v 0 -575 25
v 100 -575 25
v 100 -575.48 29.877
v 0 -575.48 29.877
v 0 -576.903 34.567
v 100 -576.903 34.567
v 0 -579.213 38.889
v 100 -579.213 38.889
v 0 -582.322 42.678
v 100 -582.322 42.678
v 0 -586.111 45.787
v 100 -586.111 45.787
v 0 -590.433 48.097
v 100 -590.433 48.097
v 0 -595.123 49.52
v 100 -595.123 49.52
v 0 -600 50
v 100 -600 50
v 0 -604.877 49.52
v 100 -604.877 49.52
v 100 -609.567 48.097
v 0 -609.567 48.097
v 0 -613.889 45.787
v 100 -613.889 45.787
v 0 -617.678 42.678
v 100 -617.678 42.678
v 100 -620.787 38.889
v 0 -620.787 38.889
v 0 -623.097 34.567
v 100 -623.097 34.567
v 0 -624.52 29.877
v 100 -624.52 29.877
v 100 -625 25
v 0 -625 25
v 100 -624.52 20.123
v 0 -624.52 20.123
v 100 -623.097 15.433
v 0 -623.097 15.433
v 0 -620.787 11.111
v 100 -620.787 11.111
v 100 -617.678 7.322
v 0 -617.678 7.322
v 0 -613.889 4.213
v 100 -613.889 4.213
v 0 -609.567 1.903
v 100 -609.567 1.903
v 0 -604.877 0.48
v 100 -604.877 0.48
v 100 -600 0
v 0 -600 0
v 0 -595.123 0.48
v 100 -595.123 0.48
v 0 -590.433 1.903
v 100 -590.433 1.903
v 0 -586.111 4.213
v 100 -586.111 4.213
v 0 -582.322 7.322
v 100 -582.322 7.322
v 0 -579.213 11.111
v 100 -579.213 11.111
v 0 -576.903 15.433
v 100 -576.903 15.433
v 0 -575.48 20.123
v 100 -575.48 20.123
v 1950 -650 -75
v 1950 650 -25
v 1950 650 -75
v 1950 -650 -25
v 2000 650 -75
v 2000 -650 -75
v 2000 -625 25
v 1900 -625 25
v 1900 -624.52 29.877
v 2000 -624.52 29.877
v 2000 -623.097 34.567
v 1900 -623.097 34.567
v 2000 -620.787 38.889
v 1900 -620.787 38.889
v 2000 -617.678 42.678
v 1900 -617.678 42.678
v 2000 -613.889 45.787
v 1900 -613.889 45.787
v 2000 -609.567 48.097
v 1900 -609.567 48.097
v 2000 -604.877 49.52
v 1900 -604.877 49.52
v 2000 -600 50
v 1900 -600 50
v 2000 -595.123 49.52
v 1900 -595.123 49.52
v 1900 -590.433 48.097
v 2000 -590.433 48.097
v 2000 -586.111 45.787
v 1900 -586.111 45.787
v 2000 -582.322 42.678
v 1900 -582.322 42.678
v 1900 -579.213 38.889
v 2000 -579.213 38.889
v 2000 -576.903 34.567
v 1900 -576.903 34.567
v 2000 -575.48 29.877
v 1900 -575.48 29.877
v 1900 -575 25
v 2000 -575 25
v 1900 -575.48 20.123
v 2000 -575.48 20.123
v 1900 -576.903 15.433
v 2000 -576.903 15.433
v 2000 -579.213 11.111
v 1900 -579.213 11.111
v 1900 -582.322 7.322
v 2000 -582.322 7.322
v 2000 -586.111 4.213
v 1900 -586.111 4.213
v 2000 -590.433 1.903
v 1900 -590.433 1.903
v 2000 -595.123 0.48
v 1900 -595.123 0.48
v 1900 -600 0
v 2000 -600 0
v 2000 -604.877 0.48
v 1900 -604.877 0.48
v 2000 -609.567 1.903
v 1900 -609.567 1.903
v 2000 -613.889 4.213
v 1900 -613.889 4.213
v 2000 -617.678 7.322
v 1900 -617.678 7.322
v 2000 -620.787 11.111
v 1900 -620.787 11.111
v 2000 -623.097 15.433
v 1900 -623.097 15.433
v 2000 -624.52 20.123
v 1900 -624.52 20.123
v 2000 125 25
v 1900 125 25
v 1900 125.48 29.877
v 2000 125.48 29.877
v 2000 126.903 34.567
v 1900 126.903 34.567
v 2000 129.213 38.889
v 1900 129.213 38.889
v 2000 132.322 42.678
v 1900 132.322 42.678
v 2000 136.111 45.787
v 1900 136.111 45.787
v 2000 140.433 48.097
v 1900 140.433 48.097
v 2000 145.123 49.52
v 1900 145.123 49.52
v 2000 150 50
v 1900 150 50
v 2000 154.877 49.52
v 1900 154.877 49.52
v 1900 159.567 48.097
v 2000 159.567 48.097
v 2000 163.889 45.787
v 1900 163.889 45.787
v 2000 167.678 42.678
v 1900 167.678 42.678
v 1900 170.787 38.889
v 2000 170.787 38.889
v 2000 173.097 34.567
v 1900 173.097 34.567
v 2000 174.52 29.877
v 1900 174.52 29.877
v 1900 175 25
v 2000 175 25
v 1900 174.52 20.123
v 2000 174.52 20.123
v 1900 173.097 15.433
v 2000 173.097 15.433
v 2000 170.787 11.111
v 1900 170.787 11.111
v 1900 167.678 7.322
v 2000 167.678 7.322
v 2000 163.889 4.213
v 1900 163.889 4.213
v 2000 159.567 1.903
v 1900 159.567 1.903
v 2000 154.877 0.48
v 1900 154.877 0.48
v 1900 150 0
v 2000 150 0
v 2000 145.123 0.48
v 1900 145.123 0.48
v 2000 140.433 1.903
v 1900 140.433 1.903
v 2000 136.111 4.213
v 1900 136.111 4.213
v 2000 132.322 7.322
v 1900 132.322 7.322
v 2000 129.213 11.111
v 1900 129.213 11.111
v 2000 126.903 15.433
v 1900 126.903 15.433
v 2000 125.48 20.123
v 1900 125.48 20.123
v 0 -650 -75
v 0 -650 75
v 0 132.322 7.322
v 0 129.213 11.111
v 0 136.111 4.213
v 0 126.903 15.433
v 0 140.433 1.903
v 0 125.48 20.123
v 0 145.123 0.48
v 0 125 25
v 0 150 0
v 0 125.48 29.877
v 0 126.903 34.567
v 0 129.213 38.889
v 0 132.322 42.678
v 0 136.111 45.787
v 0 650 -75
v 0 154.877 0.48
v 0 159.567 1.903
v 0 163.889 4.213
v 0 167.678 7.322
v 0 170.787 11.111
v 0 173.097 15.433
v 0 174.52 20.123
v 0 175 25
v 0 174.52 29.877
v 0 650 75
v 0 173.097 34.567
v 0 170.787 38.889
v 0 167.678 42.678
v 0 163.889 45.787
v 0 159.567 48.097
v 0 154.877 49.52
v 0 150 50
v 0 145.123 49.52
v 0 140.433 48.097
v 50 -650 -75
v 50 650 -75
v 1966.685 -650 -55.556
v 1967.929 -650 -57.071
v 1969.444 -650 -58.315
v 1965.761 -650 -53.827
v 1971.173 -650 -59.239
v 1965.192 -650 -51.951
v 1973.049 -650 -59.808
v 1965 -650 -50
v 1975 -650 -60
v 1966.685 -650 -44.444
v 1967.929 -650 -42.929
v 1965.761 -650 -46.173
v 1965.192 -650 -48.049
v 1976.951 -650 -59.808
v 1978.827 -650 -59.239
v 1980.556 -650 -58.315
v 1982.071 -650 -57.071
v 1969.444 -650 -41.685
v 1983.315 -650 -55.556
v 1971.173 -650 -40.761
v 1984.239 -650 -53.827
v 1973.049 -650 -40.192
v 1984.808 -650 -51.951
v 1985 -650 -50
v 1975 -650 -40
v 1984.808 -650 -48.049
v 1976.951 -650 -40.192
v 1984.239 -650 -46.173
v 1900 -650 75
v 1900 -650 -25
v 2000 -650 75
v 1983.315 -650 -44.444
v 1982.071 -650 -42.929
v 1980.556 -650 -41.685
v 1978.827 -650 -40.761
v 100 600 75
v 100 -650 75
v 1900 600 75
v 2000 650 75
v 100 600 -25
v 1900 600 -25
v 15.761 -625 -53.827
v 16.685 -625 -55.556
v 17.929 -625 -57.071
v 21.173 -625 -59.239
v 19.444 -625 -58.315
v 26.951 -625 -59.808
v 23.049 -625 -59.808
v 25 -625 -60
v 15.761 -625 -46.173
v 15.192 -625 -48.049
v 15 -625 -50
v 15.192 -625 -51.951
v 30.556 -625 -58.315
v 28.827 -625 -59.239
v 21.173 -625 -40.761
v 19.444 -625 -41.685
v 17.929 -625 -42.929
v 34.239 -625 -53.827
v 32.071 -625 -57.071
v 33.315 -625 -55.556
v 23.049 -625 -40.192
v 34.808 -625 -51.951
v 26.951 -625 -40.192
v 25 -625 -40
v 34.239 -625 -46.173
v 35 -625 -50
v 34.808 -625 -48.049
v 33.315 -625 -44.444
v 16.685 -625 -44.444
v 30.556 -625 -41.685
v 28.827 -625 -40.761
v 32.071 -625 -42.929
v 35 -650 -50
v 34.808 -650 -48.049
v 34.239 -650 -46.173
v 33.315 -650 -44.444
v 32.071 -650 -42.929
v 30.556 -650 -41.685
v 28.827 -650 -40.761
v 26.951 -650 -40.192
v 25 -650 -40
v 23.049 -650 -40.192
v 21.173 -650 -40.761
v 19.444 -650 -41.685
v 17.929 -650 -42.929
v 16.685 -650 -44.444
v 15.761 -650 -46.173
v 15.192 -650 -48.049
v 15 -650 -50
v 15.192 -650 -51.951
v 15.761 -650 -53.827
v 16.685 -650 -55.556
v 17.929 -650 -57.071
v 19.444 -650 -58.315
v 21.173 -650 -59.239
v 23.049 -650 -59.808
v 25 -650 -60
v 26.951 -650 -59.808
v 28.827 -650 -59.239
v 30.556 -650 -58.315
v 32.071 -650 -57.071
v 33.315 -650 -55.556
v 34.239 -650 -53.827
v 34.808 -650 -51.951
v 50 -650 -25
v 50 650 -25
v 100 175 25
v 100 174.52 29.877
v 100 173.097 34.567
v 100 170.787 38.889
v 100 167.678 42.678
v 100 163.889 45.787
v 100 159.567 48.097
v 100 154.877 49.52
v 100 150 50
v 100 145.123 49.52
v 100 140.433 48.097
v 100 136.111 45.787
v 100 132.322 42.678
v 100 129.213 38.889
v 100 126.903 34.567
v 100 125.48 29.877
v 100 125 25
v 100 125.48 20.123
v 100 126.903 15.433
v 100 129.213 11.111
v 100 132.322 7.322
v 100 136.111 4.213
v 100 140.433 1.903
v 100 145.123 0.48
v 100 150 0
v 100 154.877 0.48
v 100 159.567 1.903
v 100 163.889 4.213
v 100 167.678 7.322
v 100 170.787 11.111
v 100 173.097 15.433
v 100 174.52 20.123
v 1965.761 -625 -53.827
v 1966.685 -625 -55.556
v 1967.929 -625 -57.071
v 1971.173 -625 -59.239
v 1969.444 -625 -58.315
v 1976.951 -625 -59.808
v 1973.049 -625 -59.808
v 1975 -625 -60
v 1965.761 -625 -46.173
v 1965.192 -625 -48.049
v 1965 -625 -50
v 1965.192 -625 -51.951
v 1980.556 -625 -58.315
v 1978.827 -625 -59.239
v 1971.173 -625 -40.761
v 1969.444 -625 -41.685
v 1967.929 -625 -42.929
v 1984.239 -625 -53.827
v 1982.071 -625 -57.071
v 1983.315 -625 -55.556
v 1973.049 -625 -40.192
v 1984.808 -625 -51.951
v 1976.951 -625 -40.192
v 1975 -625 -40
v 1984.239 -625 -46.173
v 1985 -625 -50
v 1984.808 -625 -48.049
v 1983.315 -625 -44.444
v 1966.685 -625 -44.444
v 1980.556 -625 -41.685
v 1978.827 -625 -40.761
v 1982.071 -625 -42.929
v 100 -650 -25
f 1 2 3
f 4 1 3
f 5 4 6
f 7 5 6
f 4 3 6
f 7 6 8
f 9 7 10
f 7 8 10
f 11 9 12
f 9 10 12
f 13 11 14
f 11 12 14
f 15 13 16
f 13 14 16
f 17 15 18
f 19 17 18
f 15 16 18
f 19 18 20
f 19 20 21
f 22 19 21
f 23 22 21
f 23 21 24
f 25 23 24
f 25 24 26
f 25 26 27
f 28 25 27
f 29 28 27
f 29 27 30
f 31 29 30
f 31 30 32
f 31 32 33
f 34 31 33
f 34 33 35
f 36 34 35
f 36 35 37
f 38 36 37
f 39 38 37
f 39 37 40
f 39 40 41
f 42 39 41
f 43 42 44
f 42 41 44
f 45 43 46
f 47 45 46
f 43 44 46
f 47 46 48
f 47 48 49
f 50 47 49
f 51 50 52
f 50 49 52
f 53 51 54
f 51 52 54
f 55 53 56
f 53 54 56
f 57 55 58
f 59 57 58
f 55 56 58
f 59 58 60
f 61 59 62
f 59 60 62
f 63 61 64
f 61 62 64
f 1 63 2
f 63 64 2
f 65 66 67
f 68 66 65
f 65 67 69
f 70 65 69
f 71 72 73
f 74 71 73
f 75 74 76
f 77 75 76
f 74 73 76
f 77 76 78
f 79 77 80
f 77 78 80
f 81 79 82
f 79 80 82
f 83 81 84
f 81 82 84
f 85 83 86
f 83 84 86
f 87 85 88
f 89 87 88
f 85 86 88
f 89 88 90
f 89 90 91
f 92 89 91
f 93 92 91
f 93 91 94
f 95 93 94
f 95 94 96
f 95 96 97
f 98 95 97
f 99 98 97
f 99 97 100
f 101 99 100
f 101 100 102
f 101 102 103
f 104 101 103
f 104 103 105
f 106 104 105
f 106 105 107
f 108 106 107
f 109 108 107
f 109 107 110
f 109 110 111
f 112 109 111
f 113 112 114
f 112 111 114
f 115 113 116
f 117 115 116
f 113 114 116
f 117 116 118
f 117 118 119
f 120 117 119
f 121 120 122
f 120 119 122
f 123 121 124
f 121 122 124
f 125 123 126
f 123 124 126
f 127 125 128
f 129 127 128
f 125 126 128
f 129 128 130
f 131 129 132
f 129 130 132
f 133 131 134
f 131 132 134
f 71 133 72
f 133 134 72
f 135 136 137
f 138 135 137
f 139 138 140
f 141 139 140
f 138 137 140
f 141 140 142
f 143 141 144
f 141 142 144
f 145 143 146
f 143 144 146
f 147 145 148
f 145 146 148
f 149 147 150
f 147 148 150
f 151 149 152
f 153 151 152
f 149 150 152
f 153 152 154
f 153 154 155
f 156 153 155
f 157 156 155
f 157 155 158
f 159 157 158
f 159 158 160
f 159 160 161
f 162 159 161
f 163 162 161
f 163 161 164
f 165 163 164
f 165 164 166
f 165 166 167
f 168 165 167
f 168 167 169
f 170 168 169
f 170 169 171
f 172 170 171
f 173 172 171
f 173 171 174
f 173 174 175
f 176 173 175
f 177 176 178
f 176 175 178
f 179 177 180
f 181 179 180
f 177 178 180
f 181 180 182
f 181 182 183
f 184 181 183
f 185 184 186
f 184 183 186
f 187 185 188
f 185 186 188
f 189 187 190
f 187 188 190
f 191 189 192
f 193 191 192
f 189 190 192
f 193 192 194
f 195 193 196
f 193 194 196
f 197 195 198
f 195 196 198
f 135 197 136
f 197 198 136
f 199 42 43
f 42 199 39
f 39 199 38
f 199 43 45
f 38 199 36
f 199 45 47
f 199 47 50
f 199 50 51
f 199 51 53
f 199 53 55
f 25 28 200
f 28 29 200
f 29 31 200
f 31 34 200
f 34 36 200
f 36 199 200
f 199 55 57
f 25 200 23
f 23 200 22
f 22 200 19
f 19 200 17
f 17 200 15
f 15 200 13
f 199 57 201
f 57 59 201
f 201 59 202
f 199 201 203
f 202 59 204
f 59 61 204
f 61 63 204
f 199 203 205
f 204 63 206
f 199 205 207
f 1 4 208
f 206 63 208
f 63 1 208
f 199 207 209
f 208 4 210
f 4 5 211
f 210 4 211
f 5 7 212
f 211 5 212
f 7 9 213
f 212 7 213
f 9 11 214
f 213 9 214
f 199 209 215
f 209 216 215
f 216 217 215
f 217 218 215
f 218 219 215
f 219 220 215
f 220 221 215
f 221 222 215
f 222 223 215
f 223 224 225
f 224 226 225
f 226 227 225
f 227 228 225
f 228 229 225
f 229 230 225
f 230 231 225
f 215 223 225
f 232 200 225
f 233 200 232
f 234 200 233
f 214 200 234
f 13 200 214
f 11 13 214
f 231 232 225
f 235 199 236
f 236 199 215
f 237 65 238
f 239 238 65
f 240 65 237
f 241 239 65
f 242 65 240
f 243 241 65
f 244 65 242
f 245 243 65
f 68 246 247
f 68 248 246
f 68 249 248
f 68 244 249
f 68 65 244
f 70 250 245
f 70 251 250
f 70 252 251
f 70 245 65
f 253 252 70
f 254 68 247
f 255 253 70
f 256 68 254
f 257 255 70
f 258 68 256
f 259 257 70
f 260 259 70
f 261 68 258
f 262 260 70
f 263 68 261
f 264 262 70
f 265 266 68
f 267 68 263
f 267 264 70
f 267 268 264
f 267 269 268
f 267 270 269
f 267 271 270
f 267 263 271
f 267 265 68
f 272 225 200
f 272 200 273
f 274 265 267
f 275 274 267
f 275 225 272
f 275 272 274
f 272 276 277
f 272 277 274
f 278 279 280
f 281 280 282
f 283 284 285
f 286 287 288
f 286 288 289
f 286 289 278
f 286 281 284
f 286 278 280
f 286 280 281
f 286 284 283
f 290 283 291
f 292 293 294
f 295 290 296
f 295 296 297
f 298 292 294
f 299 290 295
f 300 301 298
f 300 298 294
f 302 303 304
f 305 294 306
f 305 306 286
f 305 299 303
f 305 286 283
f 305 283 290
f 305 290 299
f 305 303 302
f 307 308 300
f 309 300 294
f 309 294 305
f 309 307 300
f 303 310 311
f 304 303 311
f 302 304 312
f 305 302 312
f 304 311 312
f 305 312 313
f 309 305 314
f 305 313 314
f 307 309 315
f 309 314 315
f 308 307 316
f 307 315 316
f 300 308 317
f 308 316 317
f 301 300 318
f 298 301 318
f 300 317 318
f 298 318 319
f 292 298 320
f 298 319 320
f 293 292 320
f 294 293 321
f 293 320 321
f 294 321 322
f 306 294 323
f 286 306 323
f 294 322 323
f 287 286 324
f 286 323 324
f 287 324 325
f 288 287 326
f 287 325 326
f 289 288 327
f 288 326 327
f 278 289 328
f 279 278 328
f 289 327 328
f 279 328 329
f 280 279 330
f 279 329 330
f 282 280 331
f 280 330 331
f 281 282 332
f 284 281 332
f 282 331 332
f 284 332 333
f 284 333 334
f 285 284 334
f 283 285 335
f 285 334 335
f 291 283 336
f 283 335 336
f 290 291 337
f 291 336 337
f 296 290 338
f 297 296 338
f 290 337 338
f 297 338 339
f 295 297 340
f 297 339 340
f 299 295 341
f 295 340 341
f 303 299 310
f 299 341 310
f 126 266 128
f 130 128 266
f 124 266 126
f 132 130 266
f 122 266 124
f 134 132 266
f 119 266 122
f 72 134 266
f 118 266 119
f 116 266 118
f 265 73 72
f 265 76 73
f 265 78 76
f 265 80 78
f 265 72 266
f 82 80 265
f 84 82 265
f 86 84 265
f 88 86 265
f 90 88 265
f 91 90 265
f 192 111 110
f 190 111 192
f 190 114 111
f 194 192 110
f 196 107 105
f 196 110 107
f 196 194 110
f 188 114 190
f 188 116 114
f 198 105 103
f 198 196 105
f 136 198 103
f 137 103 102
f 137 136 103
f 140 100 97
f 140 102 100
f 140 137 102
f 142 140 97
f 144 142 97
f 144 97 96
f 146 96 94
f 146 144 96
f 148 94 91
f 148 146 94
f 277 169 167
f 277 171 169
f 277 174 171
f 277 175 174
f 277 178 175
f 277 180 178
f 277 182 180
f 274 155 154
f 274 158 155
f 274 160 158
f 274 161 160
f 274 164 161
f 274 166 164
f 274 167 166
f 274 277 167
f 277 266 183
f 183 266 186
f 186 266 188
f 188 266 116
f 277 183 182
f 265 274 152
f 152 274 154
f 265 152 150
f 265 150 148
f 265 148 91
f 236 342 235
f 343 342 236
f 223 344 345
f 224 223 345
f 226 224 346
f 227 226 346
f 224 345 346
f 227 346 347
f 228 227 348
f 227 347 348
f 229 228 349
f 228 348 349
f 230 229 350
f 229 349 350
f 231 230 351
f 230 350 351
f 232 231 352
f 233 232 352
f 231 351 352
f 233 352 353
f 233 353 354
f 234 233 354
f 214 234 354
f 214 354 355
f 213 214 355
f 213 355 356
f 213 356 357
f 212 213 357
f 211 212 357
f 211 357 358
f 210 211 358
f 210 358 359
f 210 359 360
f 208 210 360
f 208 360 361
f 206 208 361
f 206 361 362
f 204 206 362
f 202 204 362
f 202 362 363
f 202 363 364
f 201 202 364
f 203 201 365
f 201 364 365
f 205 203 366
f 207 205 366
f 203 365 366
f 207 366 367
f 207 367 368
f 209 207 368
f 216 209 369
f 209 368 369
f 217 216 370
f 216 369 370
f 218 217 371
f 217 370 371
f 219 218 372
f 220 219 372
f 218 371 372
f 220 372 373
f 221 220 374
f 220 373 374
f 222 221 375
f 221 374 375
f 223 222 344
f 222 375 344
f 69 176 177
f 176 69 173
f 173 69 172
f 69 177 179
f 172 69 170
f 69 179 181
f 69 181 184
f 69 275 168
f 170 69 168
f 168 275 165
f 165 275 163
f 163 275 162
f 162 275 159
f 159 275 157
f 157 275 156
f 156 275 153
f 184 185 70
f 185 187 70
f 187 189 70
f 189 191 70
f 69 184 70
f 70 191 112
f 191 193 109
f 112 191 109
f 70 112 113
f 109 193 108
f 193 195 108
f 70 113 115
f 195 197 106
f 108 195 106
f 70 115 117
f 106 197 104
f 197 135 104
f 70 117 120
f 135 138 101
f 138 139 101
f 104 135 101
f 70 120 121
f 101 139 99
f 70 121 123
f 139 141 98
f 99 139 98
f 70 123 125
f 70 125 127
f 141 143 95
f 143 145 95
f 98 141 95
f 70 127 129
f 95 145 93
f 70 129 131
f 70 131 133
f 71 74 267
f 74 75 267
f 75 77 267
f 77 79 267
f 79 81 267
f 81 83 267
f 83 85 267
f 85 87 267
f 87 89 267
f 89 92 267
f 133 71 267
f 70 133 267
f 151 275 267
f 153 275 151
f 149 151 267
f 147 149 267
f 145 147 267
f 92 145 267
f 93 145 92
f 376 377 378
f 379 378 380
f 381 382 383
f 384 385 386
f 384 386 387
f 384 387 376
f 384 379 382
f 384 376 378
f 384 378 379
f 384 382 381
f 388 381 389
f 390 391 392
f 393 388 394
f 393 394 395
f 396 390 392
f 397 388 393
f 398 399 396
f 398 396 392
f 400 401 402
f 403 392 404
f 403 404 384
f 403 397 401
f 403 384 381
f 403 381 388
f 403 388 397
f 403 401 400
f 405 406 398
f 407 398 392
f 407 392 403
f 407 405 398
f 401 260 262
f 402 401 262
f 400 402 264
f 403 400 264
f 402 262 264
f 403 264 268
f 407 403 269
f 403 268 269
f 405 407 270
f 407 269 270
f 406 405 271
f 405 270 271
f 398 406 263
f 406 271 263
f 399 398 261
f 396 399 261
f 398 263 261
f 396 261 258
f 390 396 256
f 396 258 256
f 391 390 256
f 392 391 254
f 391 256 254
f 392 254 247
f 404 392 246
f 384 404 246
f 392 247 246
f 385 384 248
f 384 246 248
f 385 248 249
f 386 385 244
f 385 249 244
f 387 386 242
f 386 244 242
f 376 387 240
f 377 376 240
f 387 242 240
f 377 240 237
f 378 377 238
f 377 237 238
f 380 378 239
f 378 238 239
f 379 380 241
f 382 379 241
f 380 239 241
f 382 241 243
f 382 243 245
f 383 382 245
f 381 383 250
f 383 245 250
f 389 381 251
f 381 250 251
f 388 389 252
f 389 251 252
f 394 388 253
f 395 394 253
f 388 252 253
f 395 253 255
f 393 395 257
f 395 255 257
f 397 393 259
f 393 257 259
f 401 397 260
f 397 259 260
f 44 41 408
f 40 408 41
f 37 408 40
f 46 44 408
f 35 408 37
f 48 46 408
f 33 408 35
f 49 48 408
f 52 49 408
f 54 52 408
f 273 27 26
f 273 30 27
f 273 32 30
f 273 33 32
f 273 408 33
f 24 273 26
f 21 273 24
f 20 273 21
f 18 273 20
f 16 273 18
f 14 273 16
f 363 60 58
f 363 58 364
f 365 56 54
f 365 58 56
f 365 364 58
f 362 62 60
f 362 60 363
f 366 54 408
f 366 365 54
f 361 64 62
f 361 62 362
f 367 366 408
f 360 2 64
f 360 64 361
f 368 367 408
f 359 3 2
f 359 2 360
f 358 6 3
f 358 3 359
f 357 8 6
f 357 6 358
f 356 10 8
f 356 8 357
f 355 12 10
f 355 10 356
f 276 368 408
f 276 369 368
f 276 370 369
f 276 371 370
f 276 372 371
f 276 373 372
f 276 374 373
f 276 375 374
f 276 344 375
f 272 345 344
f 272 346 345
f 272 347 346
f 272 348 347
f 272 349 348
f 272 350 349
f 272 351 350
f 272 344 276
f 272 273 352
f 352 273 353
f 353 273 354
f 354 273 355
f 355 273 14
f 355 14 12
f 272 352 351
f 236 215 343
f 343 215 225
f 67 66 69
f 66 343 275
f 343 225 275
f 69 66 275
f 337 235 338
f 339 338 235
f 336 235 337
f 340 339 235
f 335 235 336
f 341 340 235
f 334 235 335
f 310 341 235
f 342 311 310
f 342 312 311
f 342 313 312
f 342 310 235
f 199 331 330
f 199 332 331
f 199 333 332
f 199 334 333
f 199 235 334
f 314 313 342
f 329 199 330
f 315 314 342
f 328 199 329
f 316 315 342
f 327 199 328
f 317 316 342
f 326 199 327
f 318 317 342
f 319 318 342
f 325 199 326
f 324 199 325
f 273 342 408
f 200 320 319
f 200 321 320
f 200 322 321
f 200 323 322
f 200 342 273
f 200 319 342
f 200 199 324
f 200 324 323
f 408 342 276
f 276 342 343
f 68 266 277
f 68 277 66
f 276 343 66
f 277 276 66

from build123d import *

# Parameters (mm, degrees)
F0_W      = 1300
F0_H      = 150
F1_DEPTH  = 50
F2_W      = 1300
F2_H      = 100
F3_DEPTH  = 50
F4_W      = 50
F4_H      = 100
F5_DEPTH  = 1800
F6_DEPTH  = 100
F7_W      = 100
F7_H      = 100
F8_DEPTH  = 1250
F9_W      = 50
F9_H      = 1300
F10_DEPTH = 50
F11_R     = 25
F12_DEPTH = 200
F13_R     = 25
F14_DEPTH = 200
F15_R     = 10
F16_DEPTH = 25
F17_R     = 10
F18_DEPTH = 25


with BuildPart() as f1:
    # F0 (on Right) → F1 (new body)
    with BuildSketch(Plane.YZ):
        Rectangle(F0_W, F0_H)
    extrude(amount=F1_DEPTH)

    # F2 (on face) → F3 (join)
    with BuildSketch(Plane.YZ.offset(50)):
        with Locations((0, 25)):
            Rectangle(F2_W, F2_H)
    extrude(amount=F3_DEPTH)

    # F4 (on face) → F5 (join)
    with BuildSketch(Plane.YZ.offset(100)):
        with Locations((625, 25)):
            Rectangle(F4_W, F4_H)
    extrude(amount=F5_DEPTH)

    # F6 (add): a face of the model
    f6_faces = [f1.faces().sort_by_distance(p)[0] for p in [
        (1900, 625, 25),
    ]]
    extrude(f6_faces, amount=F6_DEPTH)

    # F7 (on face) → F8 (join)
    with BuildSketch(Plane.XZ.offset(-600)):
        with Locations((1950, 25)):
            Rectangle(F7_W, F7_H)
    extrude(amount=F8_DEPTH)

    # F9 (on face) → F10 (join)
    with BuildSketch(Plane(origin=(0, 0, -25), x_dir=(1, 0, 0), z_dir=(0, 0, -1))):
        with Locations((1975, 0)):
            Rectangle(F9_W, F9_H)
    extrude(amount=F10_DEPTH)

    # F11 (on face) → F12 (cut)
    with BuildSketch(Plane.YZ.offset(100)):
        with Locations((150, 25)):
            Circle(F11_R)
        with Locations((-600, 25)):
            Circle(F11_R)
    extrude(amount=-F12_DEPTH, mode=Mode.SUBTRACT)

    # F13 (on face) → F14 (cut)
    with BuildSketch(Plane(origin=(1900, 0, 0), x_dir=(0, -1, 0), z_dir=(-1, 0, 0))):
        with Locations((-150, 25)):
            Circle(F13_R)
        with Locations((600, 25)):
            Circle(F13_R)
    extrude(amount=-F14_DEPTH, mode=Mode.SUBTRACT)

    # F15 (on face) → F16 (cut)
    with BuildSketch(Plane.XZ.offset(650)):
        with Locations((25, -50)):
            Circle(F15_R)
    extrude(amount=-F16_DEPTH, mode=Mode.SUBTRACT)

    # F17 (on face) → F18 (cut)
    with BuildSketch(Plane.XZ.offset(650)):
        with Locations((1975, -50)):
            Circle(F17_R)
    extrude(amount=-F18_DEPTH, mode=Mode.SUBTRACT)


solid = f1.part
